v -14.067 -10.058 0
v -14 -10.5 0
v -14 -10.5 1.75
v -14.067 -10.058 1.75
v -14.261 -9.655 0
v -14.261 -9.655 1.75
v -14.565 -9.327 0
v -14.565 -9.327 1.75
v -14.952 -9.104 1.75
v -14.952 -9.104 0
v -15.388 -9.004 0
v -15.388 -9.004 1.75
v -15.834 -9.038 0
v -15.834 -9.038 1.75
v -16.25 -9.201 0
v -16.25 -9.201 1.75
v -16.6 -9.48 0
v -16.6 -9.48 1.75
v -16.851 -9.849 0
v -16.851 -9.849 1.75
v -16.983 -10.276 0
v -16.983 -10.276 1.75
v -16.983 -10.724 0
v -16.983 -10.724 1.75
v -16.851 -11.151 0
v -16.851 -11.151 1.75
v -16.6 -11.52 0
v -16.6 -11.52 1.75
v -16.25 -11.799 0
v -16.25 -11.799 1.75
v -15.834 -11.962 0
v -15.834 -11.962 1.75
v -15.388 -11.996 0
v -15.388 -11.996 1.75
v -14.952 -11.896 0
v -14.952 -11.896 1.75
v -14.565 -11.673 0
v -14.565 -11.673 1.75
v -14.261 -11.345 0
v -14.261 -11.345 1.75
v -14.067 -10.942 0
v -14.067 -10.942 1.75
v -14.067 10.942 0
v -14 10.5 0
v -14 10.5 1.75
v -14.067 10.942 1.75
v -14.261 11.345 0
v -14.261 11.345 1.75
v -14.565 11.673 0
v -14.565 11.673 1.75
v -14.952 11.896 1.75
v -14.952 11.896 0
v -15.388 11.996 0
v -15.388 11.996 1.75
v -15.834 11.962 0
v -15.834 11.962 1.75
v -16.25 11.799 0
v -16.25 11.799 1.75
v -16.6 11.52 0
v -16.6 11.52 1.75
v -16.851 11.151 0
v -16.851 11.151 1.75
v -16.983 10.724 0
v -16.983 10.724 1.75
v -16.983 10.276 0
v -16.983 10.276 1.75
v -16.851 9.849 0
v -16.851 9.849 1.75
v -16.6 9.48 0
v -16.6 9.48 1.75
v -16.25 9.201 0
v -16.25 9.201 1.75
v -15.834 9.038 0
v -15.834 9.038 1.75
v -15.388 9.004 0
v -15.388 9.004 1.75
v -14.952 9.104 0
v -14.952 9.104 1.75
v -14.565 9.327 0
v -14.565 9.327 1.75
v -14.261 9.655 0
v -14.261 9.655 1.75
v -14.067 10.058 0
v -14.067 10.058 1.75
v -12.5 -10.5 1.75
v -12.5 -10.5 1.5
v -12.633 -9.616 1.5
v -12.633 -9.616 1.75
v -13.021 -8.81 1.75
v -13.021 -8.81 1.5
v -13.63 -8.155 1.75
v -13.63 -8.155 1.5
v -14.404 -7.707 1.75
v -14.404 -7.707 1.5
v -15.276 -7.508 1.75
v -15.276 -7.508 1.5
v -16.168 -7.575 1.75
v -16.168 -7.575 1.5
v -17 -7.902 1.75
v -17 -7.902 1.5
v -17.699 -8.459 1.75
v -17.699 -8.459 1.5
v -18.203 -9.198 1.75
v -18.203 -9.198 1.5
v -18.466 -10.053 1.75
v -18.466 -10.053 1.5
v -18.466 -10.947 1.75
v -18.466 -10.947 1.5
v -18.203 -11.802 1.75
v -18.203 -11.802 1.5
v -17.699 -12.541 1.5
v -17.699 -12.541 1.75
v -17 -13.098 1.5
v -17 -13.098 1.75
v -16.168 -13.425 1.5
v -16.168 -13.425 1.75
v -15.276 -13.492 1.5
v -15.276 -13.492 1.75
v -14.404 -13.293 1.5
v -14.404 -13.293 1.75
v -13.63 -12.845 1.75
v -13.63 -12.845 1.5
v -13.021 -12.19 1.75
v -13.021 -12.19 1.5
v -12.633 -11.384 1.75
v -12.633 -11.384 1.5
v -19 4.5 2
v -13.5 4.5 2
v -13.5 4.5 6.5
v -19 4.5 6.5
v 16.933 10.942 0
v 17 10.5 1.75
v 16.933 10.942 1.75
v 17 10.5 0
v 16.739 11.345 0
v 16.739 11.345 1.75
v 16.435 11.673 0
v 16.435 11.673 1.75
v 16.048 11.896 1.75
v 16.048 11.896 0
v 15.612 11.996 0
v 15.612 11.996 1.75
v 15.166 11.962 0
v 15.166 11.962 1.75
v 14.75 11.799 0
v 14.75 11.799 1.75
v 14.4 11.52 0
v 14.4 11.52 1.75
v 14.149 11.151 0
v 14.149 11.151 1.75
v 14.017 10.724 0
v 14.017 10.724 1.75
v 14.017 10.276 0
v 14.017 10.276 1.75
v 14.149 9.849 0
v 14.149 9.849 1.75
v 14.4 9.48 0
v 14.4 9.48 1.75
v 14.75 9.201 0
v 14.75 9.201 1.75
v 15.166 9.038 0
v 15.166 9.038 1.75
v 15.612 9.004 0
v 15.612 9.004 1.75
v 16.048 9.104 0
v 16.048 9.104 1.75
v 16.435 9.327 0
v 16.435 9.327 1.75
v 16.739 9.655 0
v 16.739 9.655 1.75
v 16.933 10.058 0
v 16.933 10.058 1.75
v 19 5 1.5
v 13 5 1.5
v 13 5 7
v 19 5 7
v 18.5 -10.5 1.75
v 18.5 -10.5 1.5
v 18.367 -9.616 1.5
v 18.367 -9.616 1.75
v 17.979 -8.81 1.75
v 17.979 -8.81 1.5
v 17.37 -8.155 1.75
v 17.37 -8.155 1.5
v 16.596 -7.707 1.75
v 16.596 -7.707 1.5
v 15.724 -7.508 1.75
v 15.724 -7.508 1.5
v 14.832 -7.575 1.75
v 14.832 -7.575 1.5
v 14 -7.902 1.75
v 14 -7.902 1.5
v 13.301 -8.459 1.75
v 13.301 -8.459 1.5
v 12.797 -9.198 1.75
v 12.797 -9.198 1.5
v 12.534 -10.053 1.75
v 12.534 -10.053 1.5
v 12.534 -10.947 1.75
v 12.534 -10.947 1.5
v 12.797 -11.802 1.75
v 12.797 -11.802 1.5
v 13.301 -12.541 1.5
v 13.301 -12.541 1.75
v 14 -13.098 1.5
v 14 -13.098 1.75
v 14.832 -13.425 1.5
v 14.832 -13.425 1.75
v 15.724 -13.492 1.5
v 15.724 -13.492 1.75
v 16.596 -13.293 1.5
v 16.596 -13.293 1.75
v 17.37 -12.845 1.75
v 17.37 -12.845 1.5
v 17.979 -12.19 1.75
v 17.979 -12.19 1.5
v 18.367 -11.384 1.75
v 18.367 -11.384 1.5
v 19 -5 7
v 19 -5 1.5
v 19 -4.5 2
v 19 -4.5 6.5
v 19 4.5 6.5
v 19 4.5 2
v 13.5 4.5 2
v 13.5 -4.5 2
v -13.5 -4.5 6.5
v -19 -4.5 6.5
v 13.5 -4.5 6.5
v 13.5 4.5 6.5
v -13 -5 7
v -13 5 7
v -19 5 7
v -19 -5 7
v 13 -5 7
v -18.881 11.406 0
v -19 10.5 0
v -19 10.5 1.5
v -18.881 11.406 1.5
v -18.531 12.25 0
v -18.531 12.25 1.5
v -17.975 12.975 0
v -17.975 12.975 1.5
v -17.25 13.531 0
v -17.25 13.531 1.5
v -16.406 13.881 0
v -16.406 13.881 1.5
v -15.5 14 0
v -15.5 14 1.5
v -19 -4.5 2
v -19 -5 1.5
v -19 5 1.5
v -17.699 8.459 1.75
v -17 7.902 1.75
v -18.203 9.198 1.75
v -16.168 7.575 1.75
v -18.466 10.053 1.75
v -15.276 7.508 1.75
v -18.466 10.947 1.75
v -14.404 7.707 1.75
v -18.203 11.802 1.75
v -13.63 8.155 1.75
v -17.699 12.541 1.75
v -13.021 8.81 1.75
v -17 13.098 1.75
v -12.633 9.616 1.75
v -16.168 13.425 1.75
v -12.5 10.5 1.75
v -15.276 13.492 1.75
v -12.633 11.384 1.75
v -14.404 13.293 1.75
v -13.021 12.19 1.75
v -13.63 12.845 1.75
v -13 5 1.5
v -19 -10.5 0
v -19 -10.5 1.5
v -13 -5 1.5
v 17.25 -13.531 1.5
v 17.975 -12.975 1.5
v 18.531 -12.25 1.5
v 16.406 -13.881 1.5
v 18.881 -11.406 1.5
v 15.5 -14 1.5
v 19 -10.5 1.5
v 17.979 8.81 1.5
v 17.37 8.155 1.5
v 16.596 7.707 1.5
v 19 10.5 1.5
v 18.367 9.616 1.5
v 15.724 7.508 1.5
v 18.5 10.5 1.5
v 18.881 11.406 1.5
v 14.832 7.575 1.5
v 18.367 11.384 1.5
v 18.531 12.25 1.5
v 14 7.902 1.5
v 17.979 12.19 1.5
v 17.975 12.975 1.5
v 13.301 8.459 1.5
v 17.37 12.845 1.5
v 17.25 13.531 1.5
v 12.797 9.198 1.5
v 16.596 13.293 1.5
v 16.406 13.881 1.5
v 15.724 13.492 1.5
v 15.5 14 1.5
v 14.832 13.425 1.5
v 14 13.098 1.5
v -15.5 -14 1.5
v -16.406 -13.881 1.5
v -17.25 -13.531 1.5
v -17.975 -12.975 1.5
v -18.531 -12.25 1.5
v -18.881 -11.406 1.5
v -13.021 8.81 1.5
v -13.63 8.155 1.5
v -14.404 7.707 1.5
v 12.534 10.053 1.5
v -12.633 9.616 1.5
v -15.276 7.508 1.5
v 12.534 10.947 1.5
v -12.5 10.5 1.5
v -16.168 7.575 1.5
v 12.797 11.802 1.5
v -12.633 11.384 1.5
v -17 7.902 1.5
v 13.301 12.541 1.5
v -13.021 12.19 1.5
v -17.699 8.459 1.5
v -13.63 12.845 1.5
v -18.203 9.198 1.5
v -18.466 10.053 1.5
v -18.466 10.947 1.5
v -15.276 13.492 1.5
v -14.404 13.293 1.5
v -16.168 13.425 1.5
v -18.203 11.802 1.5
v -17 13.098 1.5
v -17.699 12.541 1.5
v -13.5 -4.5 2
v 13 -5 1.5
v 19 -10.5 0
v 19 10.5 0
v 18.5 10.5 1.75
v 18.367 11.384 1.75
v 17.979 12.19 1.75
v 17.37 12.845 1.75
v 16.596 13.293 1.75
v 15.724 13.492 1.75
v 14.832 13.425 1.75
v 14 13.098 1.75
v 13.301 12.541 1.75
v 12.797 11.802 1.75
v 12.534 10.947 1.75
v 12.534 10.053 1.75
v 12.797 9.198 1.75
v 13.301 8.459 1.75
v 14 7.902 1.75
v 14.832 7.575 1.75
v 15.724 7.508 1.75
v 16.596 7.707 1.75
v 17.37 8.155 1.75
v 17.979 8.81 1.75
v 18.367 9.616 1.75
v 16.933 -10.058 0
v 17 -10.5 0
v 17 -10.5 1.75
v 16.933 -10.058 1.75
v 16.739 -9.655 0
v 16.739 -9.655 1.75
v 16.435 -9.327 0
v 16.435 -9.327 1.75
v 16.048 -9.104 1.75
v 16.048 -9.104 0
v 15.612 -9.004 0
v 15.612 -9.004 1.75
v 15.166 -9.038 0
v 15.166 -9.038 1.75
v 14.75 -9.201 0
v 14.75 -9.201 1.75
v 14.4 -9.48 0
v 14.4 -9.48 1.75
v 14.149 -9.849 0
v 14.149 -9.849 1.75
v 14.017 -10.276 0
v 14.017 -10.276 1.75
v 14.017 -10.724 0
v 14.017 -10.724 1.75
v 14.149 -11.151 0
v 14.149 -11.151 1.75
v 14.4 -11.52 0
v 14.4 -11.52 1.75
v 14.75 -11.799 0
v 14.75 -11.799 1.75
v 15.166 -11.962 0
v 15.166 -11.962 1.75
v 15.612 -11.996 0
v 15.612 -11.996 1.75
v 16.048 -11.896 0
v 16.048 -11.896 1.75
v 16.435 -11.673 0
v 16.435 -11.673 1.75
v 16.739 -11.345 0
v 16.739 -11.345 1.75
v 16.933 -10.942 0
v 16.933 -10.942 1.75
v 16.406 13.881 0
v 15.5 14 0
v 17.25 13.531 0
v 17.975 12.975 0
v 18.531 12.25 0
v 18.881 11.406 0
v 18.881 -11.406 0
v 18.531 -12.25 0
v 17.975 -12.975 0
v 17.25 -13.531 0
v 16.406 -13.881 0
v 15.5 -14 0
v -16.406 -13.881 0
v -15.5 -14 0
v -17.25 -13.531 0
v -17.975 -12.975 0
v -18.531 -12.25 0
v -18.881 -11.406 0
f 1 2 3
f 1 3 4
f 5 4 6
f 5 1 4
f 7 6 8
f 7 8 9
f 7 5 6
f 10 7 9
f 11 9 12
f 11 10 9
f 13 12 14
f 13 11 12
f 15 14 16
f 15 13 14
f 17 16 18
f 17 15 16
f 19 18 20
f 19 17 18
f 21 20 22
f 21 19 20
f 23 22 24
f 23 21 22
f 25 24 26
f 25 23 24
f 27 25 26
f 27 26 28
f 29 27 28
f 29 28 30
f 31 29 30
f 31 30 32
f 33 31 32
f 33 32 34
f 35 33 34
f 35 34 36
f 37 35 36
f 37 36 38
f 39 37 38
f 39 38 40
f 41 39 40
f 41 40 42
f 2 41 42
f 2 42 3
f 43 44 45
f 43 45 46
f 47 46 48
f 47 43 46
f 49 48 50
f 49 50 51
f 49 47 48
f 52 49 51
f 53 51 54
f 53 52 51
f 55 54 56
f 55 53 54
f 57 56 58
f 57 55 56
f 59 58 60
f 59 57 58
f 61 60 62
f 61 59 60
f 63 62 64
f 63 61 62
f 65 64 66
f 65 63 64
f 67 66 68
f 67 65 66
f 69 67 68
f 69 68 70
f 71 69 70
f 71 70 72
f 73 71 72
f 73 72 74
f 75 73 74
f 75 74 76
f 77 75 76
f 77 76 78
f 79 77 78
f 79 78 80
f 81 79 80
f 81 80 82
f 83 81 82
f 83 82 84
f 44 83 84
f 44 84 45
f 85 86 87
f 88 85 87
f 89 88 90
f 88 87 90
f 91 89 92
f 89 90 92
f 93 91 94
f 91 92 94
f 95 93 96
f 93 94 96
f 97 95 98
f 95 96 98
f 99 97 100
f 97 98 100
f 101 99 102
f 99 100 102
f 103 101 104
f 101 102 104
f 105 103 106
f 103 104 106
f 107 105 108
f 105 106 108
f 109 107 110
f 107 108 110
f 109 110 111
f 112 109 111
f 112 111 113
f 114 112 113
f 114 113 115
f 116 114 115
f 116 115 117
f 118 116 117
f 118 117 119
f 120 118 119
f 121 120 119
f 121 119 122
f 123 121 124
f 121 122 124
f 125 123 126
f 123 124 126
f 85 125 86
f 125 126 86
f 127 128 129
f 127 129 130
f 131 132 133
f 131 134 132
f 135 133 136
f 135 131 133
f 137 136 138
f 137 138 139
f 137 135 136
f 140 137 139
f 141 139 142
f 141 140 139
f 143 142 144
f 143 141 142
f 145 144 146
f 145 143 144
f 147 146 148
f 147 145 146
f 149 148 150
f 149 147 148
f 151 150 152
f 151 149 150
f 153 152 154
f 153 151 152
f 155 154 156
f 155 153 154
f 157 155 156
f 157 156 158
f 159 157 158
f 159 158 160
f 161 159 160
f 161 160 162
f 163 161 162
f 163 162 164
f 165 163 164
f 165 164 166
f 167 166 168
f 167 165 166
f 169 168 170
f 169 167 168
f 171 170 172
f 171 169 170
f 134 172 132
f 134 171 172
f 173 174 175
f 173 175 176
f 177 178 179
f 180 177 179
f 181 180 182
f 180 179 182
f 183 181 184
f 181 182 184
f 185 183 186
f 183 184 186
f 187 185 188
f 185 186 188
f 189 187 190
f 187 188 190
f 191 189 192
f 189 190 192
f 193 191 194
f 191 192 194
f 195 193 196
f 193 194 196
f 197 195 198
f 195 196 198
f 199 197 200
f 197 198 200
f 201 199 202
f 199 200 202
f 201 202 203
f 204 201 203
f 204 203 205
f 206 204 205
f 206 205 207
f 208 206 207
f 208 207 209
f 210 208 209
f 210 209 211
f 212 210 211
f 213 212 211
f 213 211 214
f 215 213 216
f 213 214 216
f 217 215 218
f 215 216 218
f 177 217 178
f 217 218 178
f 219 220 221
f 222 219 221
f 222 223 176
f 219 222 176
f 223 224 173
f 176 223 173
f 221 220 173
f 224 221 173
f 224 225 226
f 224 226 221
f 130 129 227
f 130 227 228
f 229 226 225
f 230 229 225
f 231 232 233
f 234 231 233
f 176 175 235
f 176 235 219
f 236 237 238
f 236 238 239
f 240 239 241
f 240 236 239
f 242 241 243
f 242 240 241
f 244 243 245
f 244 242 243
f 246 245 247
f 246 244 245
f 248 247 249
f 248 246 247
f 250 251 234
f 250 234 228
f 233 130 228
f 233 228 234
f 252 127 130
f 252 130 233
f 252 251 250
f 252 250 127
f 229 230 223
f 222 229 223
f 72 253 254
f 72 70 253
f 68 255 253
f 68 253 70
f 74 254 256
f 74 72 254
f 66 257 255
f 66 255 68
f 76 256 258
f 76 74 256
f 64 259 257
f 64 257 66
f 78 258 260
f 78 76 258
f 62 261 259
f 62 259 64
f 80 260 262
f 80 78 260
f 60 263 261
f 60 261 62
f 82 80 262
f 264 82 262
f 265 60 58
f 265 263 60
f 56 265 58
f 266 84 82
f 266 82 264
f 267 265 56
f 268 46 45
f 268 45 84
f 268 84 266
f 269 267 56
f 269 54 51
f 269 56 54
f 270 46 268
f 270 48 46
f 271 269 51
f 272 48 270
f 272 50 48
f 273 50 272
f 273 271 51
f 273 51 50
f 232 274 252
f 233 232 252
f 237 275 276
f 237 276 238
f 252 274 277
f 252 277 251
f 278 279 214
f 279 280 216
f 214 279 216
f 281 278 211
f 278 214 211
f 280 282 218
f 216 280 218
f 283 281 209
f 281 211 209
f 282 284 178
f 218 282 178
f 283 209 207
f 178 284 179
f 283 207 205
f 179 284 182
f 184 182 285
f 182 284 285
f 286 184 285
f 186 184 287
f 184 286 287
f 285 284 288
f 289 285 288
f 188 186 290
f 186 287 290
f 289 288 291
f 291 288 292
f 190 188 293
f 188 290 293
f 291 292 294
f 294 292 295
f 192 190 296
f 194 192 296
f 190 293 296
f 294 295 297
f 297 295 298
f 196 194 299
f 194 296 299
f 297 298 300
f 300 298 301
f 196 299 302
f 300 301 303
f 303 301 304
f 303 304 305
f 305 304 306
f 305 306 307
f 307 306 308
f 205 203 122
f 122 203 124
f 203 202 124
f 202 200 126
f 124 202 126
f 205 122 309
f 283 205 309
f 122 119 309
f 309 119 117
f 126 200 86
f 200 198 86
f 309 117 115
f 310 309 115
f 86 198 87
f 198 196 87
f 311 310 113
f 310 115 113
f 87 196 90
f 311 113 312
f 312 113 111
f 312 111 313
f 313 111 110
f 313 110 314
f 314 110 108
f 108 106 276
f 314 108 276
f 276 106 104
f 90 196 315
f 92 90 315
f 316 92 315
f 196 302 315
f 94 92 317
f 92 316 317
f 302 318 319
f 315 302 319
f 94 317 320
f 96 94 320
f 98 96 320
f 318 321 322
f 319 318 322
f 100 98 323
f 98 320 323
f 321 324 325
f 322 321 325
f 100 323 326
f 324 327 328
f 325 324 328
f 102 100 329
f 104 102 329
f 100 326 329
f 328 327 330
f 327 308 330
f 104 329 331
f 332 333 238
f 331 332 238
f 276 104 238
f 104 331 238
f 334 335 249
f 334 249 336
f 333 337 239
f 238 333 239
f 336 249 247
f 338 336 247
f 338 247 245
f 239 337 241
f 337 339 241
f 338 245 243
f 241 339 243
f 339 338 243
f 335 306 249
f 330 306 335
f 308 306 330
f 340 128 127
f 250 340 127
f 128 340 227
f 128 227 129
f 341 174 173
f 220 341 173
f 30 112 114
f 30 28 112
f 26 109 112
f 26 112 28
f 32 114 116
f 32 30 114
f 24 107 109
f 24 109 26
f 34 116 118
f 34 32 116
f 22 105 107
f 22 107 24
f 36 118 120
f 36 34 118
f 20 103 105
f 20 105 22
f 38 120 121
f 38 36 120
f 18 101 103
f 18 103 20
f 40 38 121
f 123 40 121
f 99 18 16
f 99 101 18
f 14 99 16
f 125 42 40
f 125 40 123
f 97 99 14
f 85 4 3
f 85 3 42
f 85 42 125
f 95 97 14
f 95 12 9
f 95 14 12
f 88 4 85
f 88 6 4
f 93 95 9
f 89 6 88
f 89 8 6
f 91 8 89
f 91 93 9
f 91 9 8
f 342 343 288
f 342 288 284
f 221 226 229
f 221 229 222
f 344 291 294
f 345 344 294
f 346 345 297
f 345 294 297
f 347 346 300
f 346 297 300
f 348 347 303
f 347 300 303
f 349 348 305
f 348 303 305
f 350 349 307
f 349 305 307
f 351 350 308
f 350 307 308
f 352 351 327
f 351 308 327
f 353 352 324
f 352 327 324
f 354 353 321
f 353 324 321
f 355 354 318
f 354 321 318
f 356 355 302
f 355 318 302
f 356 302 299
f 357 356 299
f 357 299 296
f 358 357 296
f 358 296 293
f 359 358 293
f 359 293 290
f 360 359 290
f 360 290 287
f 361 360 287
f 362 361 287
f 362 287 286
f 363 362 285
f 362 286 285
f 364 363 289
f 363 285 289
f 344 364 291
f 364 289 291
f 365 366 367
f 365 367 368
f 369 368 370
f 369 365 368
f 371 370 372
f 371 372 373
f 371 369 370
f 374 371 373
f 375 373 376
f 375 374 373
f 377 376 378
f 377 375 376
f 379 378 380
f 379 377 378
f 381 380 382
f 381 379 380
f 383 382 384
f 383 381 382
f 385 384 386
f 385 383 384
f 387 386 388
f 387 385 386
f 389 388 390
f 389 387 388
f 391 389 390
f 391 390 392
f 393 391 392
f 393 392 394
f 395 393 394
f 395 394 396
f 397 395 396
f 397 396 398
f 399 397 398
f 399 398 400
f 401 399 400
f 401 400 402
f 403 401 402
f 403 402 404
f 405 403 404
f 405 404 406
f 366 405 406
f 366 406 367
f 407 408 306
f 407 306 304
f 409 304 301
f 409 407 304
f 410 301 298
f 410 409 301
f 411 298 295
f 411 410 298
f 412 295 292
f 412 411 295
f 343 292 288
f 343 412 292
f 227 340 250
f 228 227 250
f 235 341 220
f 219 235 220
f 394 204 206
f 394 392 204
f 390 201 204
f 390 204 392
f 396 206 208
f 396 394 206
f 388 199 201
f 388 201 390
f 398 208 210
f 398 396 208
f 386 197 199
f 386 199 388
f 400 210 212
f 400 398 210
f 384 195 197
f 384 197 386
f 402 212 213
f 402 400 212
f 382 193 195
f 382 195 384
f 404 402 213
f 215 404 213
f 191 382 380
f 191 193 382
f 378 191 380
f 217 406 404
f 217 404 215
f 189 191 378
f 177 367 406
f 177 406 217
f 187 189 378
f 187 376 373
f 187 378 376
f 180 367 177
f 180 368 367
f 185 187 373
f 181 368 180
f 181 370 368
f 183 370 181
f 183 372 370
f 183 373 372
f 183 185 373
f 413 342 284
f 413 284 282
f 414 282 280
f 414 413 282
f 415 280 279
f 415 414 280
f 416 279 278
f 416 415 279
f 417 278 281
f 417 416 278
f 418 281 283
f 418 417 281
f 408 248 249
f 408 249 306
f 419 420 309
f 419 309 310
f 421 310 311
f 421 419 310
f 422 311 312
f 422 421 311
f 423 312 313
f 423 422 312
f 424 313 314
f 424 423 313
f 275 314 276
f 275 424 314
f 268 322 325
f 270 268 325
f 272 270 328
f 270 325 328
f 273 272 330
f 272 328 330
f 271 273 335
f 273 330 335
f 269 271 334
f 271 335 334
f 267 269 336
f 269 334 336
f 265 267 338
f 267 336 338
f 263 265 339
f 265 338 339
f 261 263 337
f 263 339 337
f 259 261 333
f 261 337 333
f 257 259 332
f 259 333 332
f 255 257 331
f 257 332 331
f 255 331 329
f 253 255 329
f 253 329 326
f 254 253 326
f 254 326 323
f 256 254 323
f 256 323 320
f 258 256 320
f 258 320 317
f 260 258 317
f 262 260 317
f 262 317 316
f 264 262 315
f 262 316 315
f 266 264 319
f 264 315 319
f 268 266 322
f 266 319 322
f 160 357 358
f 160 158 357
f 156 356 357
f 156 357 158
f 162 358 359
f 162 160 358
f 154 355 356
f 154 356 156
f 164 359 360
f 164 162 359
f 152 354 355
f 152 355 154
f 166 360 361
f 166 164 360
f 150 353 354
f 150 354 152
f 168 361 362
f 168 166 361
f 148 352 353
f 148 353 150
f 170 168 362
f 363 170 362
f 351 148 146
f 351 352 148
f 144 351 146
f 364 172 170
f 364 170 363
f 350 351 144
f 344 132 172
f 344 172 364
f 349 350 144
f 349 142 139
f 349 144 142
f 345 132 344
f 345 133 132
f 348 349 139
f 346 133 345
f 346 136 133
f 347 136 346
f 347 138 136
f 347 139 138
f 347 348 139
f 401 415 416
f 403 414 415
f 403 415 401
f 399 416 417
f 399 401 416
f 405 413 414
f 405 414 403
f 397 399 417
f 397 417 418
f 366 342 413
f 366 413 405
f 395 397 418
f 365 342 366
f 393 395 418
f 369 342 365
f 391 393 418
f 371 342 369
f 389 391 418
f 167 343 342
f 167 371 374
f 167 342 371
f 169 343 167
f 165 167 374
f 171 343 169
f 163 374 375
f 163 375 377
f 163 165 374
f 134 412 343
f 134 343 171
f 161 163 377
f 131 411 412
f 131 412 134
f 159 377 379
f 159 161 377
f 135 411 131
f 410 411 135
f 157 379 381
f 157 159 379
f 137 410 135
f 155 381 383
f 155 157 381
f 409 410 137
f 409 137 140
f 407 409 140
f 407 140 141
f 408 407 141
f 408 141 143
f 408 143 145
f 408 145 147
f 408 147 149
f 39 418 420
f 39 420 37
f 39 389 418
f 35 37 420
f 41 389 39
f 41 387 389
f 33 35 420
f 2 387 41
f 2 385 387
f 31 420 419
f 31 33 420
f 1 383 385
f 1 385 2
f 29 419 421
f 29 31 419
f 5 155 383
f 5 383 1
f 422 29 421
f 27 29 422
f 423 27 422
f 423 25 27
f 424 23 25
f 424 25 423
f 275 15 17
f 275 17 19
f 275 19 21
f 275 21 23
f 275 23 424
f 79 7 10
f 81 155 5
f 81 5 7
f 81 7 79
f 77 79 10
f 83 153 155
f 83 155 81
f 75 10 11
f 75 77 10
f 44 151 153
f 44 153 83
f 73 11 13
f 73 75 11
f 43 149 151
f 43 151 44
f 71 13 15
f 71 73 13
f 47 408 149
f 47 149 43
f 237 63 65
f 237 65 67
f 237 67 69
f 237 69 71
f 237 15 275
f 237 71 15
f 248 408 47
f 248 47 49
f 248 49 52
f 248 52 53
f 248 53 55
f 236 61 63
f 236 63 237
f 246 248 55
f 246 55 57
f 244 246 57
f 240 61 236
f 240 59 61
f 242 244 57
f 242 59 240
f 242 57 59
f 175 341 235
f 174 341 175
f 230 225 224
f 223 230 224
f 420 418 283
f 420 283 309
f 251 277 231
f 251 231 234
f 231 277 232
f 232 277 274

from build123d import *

# Parameters (mm, degrees)
ESQUISSE1_R        = 1.5
BOSS_EXTRU_1_DEPTH = 1.5
ESQUISSE2_R        = 3
ESQUISSE2_R_2      = 1.5
BOSS_EXTRU_2_DEPTH = 0.25
ESQUISSE11_W       = 6
ESQUISSE11_H       = 10
BOSS_EXTRU_9_DEPTH = 5.5
COQUE1_T           = -0.5


with BuildPart() as part:
    # Esquisse1 → Boss.-Extru.1 (new body)
    with BuildSketch(Plane.XY):
        with BuildLine():
            ThreePointArc((-19, 10.5), (-17.974873734, 12.974873734), (-15.5, 14))
            Line((-15.5, 14), (15.5, 14))
            ThreePointArc((15.5, 14), (17.974873734, 12.974873734), (19, 10.5))
            Line((19, 10.5), (19, -10.5))
            ThreePointArc((19, -10.5), (17.974873734, -12.974873734), (15.5, -14))
            Line((15.5, -14), (-15.5, -14))
            ThreePointArc((-15.5, -14), (-17.974873734, -12.974873734), (-19, -10.5))
            Line((-19, -10.5), (-19, 10.5))
        make_face()
        with Locations((15.5, -10.5)):
            Circle(ESQUISSE1_R, mode=Mode.SUBTRACT)
        with Locations((15.5, 10.5)):
            Circle(ESQUISSE1_R, mode=Mode.SUBTRACT)
        with Locations((-15.5, -10.5)):
            Circle(ESQUISSE1_R, mode=Mode.SUBTRACT)
        with Locations((-15.5, 10.5)):
            Circle(ESQUISSE1_R, mode=Mode.SUBTRACT)
    extrude(amount=BOSS_EXTRU_1_DEPTH)

    # Esquisse2 → Boss.-Extru.2 (add)
    # profile 1 of 4: a face of its own
    with BuildSketch(Plane.XY.offset(1.5)):
        with Locations((15.5, 10.5)):
            Circle(ESQUISSE2_R)
        with Locations((15.5, 10.5)):
            Circle(ESQUISSE2_R_2, mode=Mode.SUBTRACT)
    # profile 2 of 4: a face of its own
    with BuildSketch(Plane.XY.offset(1.5)):
        with Locations((-15.5, 10.5)):
            Circle(ESQUISSE2_R)
        with Locations((-15.5, 10.5)):
            Circle(ESQUISSE2_R_2, mode=Mode.SUBTRACT)
    # profile 3 of 4: a face of its own
    with BuildSketch(Plane.XY.offset(1.5)):
        with Locations((-15.5, -10.5)):
            Circle(ESQUISSE2_R)
        with Locations((-15.5, -10.5)):
            Circle(ESQUISSE2_R_2, mode=Mode.SUBTRACT)
    # profile 4 of 4: a face of its own
    with BuildSketch(Plane.XY.offset(1.5)):
        with Locations((15.5, -10.5)):
            Circle(ESQUISSE2_R)
        with Locations((15.5, -10.5)):
            Circle(ESQUISSE2_R_2, mode=Mode.SUBTRACT)
    extrude(amount=BOSS_EXTRU_2_DEPTH)


with BuildPart() as body_2:
    # Esquisse11 → Boss.-Extru.9 (new body)
    with BuildSketch(Plane.XY.offset(1.5)):
        with Locations((16, 0)):
            Rectangle(ESQUISSE11_W, ESQUISSE11_H)
    extrude(amount=BOSS_EXTRU_9_DEPTH)

    # Coque1
    coque1_openings = [body_2.faces().sort_by_distance(p)[0] for p in [
        (19, 0, 4.25),
    ]]
    offset(amount=COQUE1_T, openings=coque1_openings, kind=Kind.INTERSECTION)


with BuildPart() as body_3:
    # Symétrie1: mirrored copy
    add(body_2.part.mirror(Plane(origin=(0, 0, 0), x_dir=(0, 0, 1), z_dir=(1, 0, 0))))


solid = Compound([part.part, body_2.part, body_3.part])
